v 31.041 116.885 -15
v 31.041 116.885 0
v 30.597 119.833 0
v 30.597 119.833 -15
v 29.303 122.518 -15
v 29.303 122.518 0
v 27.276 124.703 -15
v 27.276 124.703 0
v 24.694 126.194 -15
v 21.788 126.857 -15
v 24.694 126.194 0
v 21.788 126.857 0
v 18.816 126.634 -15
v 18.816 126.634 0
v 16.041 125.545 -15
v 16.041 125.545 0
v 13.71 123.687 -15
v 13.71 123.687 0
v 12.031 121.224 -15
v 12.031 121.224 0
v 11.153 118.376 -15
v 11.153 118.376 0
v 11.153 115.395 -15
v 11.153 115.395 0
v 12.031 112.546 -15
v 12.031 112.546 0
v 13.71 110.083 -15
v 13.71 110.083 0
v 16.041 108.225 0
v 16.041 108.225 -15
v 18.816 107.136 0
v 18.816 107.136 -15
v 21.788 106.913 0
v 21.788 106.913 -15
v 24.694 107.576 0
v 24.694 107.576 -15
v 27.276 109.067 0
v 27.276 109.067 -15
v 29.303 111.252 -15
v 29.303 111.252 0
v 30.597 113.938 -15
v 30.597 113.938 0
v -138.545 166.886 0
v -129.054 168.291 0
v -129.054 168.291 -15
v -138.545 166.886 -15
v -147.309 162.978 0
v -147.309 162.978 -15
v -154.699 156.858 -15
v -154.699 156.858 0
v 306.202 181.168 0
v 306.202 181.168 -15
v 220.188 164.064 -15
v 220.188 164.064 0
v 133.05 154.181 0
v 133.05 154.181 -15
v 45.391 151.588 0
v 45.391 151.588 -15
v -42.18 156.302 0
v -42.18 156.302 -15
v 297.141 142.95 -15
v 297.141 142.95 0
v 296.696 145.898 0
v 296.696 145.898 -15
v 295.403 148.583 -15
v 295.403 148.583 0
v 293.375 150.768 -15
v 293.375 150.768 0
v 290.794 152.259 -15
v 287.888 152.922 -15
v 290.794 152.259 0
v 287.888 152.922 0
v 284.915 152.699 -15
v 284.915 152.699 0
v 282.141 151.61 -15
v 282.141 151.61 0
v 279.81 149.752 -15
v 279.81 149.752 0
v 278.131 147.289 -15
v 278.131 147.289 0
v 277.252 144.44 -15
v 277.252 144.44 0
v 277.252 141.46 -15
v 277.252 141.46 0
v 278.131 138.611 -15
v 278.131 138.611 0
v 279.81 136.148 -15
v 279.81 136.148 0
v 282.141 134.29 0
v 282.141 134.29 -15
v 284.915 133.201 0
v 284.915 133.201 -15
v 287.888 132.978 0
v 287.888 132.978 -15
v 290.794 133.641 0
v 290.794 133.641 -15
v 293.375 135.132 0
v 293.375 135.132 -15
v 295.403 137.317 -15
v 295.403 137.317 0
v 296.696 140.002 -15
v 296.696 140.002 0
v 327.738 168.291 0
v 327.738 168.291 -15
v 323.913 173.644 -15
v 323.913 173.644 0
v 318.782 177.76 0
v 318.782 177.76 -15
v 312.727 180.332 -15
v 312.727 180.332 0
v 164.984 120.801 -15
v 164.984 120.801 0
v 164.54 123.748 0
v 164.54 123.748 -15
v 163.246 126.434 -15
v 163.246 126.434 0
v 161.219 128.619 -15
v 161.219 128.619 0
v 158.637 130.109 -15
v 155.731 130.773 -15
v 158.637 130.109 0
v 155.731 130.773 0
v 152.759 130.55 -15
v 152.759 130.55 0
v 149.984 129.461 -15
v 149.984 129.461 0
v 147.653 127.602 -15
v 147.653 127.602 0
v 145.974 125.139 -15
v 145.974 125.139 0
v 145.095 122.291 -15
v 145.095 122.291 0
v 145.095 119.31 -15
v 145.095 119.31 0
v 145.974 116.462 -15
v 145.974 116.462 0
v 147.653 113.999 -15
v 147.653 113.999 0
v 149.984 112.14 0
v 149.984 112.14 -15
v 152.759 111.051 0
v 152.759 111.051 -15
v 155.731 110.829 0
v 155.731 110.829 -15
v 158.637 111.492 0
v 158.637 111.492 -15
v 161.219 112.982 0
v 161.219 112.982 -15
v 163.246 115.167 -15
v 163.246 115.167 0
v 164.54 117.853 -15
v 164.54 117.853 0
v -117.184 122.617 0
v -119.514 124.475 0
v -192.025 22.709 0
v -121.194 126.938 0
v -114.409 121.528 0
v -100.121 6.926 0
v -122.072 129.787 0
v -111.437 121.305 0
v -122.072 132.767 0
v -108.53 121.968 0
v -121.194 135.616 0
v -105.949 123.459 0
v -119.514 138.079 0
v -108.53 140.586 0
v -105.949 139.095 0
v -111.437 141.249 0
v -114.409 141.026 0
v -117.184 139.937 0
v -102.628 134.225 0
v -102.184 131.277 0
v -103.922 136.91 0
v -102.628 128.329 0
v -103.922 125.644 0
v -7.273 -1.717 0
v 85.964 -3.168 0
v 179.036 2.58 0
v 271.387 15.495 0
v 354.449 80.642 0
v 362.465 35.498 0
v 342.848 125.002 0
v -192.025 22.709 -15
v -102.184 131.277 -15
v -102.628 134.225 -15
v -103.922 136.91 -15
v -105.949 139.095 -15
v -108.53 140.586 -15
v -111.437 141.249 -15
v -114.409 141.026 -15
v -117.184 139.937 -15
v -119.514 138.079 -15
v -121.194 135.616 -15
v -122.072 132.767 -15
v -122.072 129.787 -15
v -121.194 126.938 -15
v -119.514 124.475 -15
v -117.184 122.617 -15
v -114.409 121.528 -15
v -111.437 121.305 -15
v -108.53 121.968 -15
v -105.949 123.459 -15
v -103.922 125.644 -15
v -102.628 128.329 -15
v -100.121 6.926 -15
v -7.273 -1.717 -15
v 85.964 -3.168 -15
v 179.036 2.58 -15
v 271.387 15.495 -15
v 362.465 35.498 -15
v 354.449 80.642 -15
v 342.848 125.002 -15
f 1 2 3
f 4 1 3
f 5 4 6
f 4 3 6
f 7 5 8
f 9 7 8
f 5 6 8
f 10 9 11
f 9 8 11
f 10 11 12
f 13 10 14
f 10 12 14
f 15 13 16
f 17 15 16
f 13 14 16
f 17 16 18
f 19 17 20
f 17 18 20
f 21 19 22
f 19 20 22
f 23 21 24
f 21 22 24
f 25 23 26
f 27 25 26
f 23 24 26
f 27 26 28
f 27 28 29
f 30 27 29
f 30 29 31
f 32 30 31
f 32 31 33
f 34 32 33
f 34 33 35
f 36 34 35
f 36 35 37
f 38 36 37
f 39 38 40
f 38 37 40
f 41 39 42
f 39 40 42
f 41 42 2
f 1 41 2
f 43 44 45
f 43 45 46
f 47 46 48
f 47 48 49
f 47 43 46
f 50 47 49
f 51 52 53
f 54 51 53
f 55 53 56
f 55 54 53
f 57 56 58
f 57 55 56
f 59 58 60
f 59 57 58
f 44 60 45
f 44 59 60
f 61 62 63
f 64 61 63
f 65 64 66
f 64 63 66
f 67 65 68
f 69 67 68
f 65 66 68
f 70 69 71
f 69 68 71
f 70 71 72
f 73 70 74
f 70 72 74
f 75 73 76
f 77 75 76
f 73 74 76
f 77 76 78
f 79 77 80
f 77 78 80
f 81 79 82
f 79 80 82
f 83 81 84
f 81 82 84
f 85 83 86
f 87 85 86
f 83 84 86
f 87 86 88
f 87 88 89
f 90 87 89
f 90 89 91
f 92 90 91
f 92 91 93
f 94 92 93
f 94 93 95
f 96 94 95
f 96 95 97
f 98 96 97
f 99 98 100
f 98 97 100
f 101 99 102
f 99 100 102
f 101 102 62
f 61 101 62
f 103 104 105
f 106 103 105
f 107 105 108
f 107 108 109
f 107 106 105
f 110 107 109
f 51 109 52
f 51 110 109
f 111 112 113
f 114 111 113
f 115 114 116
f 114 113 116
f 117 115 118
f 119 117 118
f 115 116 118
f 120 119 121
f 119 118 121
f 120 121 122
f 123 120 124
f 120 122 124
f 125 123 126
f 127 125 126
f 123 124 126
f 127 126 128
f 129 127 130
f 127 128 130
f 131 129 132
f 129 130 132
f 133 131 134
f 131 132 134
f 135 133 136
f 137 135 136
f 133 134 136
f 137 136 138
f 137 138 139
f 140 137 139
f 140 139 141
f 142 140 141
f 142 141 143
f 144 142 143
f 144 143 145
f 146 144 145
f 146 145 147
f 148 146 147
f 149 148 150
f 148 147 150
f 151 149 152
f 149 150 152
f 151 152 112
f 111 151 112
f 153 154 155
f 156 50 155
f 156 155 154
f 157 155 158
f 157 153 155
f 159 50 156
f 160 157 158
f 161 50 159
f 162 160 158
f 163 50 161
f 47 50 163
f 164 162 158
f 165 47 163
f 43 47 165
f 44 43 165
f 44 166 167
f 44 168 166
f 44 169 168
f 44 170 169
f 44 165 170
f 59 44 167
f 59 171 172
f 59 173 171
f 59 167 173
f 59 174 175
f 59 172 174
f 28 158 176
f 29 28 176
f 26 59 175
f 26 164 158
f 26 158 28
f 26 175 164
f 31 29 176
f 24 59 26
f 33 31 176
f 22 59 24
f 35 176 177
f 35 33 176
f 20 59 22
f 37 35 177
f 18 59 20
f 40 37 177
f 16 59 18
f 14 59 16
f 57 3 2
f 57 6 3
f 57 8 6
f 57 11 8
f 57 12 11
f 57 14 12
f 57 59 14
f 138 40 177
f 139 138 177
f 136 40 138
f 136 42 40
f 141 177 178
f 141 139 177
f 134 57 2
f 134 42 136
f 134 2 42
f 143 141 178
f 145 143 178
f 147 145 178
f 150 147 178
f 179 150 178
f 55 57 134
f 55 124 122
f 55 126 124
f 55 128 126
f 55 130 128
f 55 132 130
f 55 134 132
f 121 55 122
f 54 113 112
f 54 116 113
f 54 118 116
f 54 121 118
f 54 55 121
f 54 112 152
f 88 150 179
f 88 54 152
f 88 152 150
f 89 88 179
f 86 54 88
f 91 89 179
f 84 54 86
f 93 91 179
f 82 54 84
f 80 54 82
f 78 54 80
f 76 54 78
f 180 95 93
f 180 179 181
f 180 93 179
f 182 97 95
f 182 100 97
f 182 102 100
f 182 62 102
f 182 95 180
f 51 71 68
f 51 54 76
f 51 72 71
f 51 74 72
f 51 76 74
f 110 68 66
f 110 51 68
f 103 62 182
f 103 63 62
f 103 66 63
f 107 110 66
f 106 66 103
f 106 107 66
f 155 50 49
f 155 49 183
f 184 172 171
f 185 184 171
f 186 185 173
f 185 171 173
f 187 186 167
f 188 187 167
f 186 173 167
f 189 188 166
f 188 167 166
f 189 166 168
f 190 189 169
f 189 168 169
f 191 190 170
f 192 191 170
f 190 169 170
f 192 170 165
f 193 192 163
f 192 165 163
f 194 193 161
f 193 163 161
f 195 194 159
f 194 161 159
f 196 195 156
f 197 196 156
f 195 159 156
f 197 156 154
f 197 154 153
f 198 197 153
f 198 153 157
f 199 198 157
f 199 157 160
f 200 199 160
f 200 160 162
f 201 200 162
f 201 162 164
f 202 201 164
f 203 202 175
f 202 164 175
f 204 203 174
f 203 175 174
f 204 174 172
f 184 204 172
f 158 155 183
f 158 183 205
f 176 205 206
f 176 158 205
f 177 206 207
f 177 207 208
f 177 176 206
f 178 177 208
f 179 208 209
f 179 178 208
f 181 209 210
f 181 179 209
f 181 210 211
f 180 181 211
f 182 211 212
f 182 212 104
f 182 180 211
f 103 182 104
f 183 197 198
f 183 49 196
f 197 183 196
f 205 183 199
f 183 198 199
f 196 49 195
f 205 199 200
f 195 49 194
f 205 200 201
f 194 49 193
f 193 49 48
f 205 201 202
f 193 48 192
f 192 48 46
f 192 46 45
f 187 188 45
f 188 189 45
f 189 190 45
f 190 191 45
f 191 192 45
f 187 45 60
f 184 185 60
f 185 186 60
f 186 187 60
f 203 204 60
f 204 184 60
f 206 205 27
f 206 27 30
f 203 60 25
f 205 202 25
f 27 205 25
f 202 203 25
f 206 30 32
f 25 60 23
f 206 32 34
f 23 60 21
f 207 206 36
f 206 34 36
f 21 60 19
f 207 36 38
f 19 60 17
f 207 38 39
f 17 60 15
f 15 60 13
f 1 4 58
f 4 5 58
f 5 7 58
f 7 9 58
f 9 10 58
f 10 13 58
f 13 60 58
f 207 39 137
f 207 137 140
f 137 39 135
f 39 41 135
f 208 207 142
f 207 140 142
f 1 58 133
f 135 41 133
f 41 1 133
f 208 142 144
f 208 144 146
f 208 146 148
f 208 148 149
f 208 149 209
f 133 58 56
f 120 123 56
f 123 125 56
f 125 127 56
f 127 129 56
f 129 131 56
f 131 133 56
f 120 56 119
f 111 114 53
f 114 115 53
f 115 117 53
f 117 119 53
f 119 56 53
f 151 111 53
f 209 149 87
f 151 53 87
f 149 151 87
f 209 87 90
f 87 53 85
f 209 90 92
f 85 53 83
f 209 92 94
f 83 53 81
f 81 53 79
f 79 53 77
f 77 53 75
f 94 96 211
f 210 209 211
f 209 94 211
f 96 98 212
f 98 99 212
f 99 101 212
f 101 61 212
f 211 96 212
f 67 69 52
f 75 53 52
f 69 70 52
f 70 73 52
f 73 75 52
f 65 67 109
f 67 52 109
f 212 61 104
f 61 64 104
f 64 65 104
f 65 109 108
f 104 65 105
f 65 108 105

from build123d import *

# Parameters (mm, degrees)
IZIM1_R            = 10
TABAN_FLAN_1_DEPTH = 15


# Sheet-metal steps are written as plain solids
with BuildPart() as part:
    # Çizim1 → Taban-Flanş1 (new body)
    with BuildSketch(Plane.XY):
        with BuildLine():
            Line((-154.698643159, 156.857538138), (-192.024974986, 22.709348381))
            ThreePointArc((-192.024974986, 22.709348381), (85.964362875, -3.168316981), (362.465125286, 35.497610073))
            ThreePointArc((362.465125286, 35.497610073), (349.092339052, 102.938005803), (327.738170112, 168.291183666))
            ThreePointArc((327.738170112, 168.291183666), (318.781629996, 177.759788443), (306.201680975, 181.168449454))
            ThreePointArc((306.201680975, 181.168449454), (89.247279864, 151.970973974), (-129.053786306, 168.291183666))
            ThreePointArc((-129.053786306, 168.291183666), (-143.060537772, 165.230713571), (-154.698643159, 156.857538138))
        make_face()
        with Locations((-112.183904076, 131.277032831)):
            Circle(IZIM1_R, mode=Mode.SUBTRACT)
        with Locations((21.040997306, 116.885172221)):
            Circle(IZIM1_R, mode=Mode.SUBTRACT)
        with Locations((154.983782422, 120.800566875)):
            Circle(IZIM1_R, mode=Mode.SUBTRACT)
        with Locations((287.140513745, 142.950022083)):
            Circle(IZIM1_R, mode=Mode.SUBTRACT)
    extrude(amount=-TABAN_FLAN_1_DEPTH)


solid = part.part
